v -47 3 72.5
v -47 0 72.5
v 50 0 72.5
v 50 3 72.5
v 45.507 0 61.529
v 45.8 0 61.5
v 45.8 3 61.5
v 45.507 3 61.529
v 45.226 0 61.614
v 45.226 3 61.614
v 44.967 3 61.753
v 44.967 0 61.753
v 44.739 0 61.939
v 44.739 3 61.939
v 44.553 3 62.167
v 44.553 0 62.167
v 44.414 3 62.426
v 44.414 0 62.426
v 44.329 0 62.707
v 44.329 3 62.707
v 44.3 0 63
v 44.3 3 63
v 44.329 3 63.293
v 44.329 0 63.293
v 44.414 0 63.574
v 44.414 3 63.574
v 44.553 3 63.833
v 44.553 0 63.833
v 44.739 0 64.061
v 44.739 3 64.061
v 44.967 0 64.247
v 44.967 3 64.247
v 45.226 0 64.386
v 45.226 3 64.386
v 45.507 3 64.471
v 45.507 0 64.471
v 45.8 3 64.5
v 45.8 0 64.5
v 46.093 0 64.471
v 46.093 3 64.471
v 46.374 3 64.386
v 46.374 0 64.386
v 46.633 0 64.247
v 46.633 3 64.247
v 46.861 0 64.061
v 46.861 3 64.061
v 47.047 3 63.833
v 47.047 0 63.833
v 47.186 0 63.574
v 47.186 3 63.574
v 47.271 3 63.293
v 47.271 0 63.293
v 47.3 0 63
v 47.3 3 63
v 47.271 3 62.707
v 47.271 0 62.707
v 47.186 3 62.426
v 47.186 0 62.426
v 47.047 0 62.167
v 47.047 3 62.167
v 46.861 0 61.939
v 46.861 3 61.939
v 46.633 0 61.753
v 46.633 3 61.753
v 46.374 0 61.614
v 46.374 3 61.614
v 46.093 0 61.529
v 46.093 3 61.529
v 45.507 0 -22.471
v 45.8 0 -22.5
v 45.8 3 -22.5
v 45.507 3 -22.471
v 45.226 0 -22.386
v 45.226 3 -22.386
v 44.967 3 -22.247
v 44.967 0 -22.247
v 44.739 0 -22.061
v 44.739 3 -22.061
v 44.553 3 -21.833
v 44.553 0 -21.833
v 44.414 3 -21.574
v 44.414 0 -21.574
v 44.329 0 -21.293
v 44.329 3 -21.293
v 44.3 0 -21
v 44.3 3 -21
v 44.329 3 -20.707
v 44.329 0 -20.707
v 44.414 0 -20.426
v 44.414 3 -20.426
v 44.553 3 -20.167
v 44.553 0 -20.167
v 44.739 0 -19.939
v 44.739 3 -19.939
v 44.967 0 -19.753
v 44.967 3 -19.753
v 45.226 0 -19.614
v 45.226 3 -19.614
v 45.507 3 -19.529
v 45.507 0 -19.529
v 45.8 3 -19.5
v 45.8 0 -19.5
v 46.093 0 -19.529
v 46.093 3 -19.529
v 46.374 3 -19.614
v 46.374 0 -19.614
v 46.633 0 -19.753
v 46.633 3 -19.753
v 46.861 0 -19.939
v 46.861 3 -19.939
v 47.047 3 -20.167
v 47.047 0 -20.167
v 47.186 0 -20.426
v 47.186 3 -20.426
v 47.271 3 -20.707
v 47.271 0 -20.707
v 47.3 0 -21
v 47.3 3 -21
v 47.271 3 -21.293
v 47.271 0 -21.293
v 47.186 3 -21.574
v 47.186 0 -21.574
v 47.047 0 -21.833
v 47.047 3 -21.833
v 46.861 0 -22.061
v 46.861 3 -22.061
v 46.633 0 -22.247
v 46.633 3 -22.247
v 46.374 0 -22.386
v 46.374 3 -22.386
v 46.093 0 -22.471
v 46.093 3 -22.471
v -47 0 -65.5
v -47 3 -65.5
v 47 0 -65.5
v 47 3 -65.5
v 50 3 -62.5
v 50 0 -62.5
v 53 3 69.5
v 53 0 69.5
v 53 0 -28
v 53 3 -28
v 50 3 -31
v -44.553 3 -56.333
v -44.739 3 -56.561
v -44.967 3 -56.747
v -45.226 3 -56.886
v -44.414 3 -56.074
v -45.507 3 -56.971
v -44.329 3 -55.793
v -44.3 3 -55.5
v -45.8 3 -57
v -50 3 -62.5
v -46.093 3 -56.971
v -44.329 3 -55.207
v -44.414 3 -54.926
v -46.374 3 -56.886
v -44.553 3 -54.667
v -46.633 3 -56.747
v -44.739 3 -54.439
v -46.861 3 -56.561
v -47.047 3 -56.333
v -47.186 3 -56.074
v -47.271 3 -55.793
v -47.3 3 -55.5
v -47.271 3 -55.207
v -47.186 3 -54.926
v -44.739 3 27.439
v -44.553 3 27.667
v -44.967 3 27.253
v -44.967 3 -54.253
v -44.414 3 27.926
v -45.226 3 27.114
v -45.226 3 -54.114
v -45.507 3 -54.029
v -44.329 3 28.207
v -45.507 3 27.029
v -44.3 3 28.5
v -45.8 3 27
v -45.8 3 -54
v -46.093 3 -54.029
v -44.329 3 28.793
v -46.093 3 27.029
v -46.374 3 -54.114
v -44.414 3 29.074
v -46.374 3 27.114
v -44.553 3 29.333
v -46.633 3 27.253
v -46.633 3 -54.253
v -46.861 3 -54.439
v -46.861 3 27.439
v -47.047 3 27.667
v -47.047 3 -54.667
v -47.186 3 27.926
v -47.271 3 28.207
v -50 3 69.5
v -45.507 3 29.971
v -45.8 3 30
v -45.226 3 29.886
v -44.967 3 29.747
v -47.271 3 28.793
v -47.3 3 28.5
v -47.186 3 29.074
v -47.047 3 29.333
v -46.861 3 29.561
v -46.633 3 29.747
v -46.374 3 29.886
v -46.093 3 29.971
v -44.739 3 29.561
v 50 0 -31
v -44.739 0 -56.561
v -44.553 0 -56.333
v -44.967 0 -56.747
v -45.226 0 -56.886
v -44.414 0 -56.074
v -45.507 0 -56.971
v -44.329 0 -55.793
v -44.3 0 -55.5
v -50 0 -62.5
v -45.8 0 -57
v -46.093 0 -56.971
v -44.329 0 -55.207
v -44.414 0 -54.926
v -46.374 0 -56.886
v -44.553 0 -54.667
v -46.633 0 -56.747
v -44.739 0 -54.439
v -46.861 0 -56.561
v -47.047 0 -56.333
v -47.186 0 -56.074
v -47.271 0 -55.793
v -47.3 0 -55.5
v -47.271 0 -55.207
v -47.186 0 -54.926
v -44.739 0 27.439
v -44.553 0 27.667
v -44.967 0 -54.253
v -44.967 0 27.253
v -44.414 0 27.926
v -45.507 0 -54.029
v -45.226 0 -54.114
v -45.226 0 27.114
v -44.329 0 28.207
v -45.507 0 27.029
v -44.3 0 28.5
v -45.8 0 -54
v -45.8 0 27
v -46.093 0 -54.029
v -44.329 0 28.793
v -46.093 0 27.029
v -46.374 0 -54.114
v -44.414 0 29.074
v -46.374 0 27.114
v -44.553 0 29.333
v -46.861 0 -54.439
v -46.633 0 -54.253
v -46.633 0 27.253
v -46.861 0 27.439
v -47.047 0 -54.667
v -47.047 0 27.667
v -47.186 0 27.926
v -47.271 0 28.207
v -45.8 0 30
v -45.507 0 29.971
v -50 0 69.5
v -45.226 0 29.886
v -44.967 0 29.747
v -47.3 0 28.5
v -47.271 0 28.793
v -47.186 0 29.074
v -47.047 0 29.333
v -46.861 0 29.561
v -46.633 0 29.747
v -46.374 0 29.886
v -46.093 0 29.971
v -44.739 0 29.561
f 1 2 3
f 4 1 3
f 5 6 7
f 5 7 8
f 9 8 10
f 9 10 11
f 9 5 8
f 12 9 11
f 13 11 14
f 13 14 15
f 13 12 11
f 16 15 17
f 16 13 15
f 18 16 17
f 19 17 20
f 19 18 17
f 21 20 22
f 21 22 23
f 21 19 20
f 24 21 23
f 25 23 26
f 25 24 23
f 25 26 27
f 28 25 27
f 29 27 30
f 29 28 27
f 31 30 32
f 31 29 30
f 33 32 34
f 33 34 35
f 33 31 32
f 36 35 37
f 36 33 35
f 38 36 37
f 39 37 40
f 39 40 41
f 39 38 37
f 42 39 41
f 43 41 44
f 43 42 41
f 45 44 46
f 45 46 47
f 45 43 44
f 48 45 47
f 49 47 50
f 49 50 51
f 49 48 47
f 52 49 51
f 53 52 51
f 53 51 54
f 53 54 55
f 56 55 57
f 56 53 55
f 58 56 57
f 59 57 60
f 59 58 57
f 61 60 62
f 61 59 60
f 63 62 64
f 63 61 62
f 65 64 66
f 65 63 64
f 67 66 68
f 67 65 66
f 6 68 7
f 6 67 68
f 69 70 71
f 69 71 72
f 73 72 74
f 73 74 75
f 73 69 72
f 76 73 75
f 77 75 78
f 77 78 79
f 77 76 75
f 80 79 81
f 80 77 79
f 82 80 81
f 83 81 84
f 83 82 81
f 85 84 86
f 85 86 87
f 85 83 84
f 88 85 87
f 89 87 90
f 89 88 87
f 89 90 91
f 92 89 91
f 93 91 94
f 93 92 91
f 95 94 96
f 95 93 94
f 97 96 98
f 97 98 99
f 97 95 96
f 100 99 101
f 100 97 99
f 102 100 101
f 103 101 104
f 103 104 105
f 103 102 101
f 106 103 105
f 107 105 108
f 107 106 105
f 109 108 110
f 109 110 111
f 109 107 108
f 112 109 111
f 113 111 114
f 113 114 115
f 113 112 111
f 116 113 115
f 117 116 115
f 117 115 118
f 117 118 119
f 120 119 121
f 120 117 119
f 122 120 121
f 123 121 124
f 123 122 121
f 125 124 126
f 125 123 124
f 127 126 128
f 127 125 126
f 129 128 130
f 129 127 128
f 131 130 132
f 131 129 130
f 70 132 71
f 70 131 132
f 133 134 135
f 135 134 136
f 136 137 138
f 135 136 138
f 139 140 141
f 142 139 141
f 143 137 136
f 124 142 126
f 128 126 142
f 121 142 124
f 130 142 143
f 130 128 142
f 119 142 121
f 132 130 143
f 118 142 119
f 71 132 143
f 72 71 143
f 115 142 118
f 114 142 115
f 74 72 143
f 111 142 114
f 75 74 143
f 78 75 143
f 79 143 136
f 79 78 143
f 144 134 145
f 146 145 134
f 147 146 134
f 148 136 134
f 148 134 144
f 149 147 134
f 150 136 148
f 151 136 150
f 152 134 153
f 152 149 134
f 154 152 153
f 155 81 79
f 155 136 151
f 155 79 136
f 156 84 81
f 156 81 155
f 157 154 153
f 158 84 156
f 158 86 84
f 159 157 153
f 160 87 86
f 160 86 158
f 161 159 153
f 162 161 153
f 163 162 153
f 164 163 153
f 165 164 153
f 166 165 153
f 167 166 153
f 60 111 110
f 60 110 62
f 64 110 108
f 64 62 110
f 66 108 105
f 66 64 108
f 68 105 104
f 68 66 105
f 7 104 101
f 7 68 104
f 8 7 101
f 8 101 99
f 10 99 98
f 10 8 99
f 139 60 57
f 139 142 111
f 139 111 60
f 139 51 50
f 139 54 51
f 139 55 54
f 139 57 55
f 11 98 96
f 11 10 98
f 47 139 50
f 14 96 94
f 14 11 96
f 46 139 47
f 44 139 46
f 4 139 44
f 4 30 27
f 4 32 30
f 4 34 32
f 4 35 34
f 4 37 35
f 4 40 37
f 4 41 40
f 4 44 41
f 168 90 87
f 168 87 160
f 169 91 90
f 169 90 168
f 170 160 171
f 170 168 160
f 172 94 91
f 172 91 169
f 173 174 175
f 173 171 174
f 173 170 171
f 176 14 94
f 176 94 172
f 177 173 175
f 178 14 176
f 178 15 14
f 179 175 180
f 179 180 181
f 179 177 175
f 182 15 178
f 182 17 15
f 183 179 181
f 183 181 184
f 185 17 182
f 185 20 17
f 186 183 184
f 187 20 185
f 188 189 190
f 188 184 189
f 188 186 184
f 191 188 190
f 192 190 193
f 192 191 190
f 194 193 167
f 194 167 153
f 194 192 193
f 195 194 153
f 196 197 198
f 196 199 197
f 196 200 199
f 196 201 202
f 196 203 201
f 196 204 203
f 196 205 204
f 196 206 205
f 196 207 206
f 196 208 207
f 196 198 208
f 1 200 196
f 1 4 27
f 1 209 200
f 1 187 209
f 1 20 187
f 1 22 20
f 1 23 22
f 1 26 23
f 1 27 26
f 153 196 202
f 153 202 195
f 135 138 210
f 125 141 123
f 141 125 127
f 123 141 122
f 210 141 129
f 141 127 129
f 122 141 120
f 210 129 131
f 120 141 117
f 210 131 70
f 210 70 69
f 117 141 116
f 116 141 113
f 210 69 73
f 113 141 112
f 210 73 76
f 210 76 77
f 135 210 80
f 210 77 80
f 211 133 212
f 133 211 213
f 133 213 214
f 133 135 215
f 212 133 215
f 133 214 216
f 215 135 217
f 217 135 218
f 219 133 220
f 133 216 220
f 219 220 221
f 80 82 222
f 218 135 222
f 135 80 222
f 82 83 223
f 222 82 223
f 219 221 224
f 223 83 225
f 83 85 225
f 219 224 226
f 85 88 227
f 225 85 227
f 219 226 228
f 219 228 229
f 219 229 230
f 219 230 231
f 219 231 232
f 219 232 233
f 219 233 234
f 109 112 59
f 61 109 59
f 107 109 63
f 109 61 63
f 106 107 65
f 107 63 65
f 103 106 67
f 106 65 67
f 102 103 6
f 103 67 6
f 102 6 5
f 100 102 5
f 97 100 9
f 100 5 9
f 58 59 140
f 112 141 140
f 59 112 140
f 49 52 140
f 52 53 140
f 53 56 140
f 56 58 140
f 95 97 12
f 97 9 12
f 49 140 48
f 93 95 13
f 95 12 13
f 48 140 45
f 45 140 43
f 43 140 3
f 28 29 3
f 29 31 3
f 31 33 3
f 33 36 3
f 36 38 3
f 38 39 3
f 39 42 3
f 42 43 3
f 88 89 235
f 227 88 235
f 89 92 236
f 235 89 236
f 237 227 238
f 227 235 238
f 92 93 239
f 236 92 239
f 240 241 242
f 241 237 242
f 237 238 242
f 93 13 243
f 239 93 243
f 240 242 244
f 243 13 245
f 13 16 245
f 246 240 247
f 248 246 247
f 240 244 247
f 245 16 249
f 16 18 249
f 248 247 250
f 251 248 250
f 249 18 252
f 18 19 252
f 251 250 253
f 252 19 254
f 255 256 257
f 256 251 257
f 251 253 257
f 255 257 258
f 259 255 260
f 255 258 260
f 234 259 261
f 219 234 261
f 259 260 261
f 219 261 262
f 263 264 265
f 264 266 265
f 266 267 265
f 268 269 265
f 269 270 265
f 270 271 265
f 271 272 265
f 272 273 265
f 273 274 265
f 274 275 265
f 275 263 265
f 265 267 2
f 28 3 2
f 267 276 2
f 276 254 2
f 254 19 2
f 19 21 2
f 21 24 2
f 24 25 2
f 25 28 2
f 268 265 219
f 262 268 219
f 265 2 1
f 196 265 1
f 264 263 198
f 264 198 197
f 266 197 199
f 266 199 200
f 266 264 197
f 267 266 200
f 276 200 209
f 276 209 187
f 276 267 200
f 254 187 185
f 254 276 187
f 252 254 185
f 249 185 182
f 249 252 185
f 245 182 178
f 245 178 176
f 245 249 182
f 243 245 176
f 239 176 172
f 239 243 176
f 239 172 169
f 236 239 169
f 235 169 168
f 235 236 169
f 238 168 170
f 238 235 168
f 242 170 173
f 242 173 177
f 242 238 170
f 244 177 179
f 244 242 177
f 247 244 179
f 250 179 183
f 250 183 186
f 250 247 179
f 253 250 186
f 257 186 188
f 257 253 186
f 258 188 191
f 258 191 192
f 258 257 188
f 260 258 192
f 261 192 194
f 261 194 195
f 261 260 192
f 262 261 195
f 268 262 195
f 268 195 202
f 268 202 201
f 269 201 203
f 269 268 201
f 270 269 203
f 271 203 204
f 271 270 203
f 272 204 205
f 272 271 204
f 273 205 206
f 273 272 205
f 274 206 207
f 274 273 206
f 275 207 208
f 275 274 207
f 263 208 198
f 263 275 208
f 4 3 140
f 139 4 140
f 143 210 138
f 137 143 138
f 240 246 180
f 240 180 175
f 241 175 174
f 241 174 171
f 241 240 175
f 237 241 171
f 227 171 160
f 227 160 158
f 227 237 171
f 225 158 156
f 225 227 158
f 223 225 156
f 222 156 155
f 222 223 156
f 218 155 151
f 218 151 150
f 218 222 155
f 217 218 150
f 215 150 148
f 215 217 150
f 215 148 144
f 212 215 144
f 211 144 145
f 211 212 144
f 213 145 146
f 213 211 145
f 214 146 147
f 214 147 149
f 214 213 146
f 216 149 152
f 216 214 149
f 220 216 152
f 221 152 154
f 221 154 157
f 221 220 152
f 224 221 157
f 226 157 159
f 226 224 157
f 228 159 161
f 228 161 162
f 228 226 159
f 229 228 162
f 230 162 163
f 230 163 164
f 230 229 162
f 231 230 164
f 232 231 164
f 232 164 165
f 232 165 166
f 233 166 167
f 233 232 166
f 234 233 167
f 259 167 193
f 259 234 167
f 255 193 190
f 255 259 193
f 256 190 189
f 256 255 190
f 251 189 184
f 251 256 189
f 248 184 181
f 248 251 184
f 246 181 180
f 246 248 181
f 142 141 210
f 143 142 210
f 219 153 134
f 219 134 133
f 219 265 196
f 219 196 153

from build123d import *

# Parameters (mm, degrees)
SKETCH1_W           = 100
SKETCH1_H           = 145
SKETCH1_R           = 1.5
BOSS_EXTRUDE1_DEPTH = 3
SKETCH2_W           = 100
SKETCH2_H           = 7
CUT_EXTRUDE1_DEPTH  = 89.120655921
BOSS_EXTRUDE2_DEPTH = 3
CHAMFER1_SIZE       = 3
CHAMFER2_SIZE       = 3


with BuildPart() as part:
    # Sketch1 → Boss-Extrude1 (new body)
    with BuildSketch(Plane(origin=(0, 0, 0), x_dir=(1, 0, 0), z_dir=(0, 1, 0))):
        Rectangle(SKETCH1_W, SKETCH1_H)
        with Locations(Location((-45.8, 55.5, 0), (0, 0, 270))):
            Circle(SKETCH1_R, mode=Mode.SUBTRACT)
        with Locations(Location((-45.8, -28.5, 0), (0, 0, 270))):
            Circle(SKETCH1_R, mode=Mode.SUBTRACT)
        with Locations(Location((45.8, -63, 0), (0, 0, 90))):
            Circle(SKETCH1_R, mode=Mode.SUBTRACT)
        with Locations(Location((45.8, 21, 0), (0, 0, 90))):
            Circle(SKETCH1_R, mode=Mode.SUBTRACT)
    extrude(amount=BOSS_EXTRUDE1_DEPTH)

    # Sketch2 → Cut-Extrude1 (cut, through all)
    with BuildSketch(Plane(origin=(0, 3, 0), x_dir=(1, 0, 0), z_dir=(0, 1, 0))):
        with Locations((0, 69)):
            Rectangle(SKETCH2_W, SKETCH2_H)
    extrude(amount=-CUT_EXTRUDE1_DEPTH, mode=Mode.SUBTRACT)

    # Sketch3 → Boss-Extrude2 (add)
    with BuildSketch(Plane.XZ):
        Polygon((50, 72.5), (53, 69.5), (53, -28), (50, -31), align=None)
    extrude(amount=-BOSS_EXTRUDE2_DEPTH)

    # Chamfer1
    chamfer1_edges = [part.edges().sort_by_distance(p)[0] for p in [
        (-50, 1.5, -65.5),
        (50, 1.5, -65.5),
    ]]
    chamfer(chamfer1_edges, length=CHAMFER1_SIZE)

    # Chamfer2
    chamfer2_edges = [part.edges().sort_by_distance(p)[0] for p in [
        (-50, 1.5, 72.5),
    ]]
    chamfer(chamfer2_edges, length=CHAMFER2_SIZE)


solid = part.part
